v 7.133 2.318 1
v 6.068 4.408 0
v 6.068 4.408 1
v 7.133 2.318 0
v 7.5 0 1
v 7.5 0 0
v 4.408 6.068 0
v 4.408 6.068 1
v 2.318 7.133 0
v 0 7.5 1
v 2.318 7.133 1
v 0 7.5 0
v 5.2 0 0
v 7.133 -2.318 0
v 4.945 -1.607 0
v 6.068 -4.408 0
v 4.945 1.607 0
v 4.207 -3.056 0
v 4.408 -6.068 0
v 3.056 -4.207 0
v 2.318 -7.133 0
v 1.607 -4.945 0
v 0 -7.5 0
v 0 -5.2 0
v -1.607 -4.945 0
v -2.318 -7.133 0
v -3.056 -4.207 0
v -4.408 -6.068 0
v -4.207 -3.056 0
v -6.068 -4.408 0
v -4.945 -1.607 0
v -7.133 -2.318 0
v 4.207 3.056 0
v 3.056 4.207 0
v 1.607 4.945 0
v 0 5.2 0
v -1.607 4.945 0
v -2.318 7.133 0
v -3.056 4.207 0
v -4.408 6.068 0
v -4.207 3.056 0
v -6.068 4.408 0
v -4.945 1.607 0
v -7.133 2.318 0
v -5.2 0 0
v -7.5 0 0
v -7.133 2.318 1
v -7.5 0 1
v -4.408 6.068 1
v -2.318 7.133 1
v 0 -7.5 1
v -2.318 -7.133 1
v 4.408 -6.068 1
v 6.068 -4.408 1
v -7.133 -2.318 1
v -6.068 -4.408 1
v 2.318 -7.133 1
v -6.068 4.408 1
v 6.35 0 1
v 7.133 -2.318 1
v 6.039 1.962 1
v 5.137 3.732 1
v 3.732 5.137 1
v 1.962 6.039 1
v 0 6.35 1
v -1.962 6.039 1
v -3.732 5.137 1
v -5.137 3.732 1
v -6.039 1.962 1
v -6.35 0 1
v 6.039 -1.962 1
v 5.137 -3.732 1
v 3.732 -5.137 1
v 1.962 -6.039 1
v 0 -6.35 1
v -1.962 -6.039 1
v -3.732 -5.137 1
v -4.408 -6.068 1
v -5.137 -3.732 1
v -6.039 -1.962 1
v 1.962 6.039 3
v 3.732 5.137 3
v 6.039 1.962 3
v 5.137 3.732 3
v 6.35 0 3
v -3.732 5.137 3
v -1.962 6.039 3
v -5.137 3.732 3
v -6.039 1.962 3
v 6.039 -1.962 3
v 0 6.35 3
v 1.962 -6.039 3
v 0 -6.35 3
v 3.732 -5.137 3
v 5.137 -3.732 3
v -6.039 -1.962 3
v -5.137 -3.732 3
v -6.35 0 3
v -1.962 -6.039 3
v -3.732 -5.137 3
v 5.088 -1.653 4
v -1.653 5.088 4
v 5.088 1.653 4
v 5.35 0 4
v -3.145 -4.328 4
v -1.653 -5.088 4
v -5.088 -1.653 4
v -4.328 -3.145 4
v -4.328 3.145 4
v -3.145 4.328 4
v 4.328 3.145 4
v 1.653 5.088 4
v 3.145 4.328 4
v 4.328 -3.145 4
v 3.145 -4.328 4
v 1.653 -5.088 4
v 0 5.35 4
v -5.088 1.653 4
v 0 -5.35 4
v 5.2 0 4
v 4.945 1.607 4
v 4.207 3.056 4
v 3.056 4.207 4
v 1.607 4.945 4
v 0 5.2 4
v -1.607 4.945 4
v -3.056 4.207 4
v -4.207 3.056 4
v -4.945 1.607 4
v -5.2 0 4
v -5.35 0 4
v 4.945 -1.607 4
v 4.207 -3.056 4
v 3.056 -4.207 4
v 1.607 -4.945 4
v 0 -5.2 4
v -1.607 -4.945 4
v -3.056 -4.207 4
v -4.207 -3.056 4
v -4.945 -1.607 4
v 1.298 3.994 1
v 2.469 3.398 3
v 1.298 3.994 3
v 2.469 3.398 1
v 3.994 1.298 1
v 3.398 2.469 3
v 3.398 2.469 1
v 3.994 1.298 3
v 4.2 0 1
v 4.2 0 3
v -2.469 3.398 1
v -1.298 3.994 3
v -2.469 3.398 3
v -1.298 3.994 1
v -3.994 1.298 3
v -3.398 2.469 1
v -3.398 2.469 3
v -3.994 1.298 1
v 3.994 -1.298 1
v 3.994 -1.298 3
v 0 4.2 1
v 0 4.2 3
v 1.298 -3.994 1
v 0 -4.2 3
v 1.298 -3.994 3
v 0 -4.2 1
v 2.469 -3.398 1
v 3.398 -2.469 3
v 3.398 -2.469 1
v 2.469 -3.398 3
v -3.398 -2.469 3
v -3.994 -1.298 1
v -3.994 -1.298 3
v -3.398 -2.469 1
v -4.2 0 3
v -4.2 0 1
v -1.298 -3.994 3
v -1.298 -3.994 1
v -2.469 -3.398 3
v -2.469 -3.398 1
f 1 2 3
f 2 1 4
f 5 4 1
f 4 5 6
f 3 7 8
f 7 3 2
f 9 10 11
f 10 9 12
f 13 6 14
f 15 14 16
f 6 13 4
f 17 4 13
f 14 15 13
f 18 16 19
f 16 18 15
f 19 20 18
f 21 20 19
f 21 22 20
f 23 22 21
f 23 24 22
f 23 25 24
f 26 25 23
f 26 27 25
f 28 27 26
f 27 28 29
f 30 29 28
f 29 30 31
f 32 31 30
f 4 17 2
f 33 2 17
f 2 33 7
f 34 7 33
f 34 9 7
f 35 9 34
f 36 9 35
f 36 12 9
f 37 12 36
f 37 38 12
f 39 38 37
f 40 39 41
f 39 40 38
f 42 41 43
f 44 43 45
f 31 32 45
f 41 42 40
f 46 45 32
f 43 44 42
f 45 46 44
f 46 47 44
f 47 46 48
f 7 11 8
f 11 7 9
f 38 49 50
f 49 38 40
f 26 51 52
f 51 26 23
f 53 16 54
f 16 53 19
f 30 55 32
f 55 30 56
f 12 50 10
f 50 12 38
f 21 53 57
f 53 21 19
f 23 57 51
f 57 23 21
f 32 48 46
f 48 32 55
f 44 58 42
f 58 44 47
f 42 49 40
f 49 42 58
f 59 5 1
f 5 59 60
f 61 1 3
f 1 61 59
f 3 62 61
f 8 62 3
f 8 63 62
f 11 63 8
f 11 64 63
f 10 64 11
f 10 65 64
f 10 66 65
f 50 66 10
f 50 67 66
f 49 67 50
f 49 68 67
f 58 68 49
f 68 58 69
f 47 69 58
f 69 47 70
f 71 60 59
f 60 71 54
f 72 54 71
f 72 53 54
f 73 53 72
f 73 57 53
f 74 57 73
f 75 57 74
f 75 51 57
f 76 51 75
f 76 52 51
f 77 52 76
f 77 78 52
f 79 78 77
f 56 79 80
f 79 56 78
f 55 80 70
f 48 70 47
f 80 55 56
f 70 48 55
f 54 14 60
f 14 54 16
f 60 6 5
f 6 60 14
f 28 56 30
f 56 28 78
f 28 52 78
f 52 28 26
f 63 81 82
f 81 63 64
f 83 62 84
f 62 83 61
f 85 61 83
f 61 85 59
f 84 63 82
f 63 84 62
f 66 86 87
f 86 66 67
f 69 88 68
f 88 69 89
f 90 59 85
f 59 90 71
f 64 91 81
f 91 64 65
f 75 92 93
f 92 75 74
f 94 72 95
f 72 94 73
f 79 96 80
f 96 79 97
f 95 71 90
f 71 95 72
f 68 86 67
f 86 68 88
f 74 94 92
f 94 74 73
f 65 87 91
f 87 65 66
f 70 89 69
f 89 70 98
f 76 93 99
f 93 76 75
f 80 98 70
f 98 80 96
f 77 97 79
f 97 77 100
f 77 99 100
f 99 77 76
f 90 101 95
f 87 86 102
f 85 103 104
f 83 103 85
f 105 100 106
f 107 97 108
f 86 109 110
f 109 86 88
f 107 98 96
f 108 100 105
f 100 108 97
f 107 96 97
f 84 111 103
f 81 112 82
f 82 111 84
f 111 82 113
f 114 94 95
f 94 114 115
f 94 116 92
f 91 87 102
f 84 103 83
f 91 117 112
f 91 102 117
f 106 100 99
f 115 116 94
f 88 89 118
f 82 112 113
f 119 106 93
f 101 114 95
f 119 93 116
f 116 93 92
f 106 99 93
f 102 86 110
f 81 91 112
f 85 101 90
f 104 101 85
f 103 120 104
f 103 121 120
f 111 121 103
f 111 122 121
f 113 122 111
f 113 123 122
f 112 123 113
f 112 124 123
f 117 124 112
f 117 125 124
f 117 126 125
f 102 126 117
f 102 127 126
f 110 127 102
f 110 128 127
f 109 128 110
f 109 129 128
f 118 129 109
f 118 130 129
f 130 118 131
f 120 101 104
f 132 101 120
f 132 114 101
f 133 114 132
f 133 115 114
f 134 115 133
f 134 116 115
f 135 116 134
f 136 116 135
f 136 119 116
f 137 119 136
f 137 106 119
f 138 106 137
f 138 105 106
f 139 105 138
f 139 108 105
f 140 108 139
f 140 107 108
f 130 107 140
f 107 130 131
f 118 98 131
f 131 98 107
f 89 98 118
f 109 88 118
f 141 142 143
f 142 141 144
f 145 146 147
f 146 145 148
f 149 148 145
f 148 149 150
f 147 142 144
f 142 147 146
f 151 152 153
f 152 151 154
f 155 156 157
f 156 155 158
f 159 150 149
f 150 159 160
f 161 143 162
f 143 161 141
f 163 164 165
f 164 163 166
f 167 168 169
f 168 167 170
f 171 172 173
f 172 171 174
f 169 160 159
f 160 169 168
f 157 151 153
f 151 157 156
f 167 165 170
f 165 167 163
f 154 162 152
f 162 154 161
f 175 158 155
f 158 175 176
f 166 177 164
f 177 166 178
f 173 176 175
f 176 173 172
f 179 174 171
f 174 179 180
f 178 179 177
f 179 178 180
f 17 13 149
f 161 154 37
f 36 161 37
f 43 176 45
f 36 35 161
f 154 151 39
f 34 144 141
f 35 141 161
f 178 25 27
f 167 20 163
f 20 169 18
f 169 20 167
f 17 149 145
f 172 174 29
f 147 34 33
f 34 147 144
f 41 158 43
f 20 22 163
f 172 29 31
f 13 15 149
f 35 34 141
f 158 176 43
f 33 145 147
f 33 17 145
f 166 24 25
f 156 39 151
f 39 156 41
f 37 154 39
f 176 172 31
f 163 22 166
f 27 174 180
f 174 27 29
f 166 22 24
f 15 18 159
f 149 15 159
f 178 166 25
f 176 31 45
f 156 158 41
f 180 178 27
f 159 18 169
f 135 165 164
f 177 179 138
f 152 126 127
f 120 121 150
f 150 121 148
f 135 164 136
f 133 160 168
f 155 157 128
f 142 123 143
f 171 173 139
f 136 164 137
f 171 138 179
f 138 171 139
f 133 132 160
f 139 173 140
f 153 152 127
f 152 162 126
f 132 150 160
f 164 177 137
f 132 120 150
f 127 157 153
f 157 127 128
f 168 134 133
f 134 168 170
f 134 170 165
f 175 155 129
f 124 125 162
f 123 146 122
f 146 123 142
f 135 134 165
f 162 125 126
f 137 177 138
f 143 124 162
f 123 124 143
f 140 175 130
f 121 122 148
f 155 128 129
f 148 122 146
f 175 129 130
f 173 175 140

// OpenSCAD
h1=1;
h2=3;

d1=15;
d2=12.7;

d3=8.4;

difference()
{
union()
{
cylinder(h1,d1/2,d1/2,$fn=20);
cylinder(h2,d2/2,d2/2,$fn=20);
translate([0,0,h2]) cylinder(1,d2/2,d2/2-1,$fn=20);
}
cylinder(h2+2,d3/2,d3/2,$fn=20);
cylinder(1,d3/2+1,d3/2,$fn=20);
translate([0,0,h2]) cylinder(1,d3/2,d3/2+1,$fn=20);
}
